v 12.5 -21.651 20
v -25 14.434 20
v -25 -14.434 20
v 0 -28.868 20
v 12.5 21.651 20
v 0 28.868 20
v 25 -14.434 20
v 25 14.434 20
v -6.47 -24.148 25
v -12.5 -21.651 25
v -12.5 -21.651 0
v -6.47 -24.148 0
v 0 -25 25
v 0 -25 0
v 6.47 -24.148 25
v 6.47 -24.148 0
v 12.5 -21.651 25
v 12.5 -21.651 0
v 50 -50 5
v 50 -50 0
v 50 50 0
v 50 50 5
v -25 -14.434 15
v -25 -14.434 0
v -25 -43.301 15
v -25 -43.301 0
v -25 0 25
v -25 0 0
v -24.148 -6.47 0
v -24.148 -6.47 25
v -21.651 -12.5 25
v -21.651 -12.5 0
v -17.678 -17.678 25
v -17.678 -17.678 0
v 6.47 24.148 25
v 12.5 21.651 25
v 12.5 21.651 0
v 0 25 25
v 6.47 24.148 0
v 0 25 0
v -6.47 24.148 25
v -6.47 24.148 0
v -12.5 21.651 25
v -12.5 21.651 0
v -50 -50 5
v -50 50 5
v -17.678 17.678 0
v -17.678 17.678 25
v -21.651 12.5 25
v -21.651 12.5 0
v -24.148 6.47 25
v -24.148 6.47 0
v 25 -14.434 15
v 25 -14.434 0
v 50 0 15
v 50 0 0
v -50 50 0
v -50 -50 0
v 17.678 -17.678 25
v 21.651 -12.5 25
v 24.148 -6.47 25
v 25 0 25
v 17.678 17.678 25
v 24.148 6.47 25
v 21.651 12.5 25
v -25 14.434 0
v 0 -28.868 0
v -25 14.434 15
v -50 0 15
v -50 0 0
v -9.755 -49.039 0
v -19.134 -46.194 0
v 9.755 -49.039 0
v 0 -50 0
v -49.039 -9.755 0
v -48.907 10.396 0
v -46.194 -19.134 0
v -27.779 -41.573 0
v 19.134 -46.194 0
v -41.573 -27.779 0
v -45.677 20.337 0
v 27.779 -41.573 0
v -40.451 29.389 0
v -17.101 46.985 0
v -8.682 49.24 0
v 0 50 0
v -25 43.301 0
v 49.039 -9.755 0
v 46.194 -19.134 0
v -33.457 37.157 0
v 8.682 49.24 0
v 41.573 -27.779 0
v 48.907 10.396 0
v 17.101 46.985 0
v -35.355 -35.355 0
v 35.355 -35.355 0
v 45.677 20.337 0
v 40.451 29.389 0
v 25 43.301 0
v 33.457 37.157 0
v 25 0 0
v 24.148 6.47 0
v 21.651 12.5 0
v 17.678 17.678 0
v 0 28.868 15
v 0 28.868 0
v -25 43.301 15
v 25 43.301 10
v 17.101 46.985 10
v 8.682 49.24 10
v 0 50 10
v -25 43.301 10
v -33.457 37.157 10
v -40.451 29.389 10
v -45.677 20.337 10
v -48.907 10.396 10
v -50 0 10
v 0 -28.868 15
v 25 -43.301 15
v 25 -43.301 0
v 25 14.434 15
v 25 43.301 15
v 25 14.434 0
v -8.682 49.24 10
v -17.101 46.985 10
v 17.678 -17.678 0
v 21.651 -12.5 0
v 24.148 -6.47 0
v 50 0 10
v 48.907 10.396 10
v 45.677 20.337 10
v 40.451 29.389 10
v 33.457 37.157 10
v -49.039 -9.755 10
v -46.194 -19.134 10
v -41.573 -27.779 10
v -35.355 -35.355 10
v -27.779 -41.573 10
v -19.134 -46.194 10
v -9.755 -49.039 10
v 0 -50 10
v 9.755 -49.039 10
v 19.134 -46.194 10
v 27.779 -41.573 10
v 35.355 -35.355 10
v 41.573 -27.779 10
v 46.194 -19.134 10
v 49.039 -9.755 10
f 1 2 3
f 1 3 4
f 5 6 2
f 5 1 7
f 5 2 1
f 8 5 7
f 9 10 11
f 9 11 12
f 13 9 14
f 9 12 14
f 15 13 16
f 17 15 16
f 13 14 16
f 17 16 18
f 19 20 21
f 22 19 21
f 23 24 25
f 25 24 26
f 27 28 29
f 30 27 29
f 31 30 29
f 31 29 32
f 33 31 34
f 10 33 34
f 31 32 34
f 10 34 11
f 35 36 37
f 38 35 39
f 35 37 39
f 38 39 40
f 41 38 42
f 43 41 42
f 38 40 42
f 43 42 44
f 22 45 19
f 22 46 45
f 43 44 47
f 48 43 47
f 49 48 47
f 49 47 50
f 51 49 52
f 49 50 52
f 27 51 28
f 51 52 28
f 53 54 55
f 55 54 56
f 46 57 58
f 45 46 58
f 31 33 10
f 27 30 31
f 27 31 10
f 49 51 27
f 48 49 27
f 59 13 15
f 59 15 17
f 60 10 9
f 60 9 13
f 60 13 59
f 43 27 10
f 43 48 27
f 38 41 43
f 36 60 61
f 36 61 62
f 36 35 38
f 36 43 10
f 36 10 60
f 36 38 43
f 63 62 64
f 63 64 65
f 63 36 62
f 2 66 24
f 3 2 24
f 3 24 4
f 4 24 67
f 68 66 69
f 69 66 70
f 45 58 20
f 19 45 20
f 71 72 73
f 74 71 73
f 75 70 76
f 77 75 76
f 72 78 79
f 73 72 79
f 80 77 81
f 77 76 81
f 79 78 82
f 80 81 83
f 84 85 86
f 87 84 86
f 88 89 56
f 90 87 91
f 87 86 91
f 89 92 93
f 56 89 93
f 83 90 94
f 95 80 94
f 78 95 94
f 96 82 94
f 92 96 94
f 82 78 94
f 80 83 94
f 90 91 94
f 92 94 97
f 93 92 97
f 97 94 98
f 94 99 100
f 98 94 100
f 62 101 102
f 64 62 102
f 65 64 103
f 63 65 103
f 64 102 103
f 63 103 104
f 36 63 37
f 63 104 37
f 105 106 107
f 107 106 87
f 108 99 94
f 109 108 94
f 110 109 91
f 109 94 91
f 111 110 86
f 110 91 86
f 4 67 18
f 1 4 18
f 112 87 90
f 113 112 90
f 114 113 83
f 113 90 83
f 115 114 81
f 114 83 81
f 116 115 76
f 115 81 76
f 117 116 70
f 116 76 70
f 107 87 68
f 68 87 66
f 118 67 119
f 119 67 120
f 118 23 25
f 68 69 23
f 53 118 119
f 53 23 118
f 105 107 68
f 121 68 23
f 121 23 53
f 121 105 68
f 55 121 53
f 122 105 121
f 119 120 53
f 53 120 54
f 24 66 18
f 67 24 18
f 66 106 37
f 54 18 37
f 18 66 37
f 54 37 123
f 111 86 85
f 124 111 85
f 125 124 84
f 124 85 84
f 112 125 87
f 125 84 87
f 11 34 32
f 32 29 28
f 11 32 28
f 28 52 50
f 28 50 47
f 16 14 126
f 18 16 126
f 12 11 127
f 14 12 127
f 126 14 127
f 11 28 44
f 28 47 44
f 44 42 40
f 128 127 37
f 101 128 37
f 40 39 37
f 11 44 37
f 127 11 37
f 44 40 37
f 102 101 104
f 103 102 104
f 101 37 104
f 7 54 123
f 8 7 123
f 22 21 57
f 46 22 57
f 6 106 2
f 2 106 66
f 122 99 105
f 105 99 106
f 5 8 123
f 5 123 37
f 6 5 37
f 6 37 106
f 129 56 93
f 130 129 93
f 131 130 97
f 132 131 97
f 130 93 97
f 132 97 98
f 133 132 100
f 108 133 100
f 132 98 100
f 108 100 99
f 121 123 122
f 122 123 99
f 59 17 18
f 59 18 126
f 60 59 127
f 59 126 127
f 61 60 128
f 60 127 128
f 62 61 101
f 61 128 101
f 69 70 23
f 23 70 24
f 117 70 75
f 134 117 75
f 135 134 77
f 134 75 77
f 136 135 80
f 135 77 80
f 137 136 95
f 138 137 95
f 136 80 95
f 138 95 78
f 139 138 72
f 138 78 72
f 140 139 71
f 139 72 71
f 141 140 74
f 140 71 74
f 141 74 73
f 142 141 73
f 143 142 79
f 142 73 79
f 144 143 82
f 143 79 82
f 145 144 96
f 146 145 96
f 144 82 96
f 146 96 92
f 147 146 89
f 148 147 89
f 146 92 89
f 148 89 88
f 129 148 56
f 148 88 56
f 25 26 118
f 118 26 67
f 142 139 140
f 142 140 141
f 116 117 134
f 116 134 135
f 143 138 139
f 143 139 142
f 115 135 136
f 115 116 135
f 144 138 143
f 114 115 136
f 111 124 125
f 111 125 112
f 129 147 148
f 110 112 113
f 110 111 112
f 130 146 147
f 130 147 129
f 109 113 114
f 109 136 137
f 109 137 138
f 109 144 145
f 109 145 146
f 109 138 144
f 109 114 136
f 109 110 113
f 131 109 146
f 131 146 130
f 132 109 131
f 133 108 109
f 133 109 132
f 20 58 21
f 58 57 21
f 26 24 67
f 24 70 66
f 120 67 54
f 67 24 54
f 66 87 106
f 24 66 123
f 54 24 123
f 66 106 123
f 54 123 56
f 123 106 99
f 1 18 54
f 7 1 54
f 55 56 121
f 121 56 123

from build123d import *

# Parameters (mm, degrees)
F1_DEPTH = 25
F2_DEPTH = 20
F3_DEPTH = 15
F4_DEPTH = 10
F5_DEPTH = 5


with BuildPart() as f1:
    # F0 (on Top) → F1 (new body)
    with BuildSketch(Plane.XY):
        with BuildLine():
            ThreePointArc((12.5000002531, -21.6506349485), (21.6506351677, -12.4999998734), (25, 0))
            ThreePointArc((25, 0), (21.6506351909, 12.4999998333), (12.5000003334, 21.6506349021))
            ThreePointArc((12.5000003334, 21.6506349021), (3.194e-07, 25), (-12.4999997802, 21.6506352215))
            ThreePointArc((-12.4999997802, 21.6506352215), (-21.650635044, 12.5000000877), (-25, -5.13e-08))
            ThreePointArc((-25, -5.13e-08), (-21.6506351561, -12.4999998936), (-12.5000002572, -21.6506349461))
            ThreePointArc((-12.5000002572, -21.6506349461), (-2.4e-09, -25), (12.5000002531, -21.6506349485))
        make_face()
    extrude(amount=F1_DEPTH)


with BuildPart() as f2:
    # F0 (on Top) → F2 (new body)
    with BuildSketch(Plane.XY):
        with BuildLine():
            Line((-12.4999997802, 21.6506352215), (-25, 14.4337567297))
            Line((-25, 14.4337567297), (-25, -5.13e-08))
            ThreePointArc((-25, -5.13e-08), (-21.650635044, 12.5000000877), (-12.4999997802, 21.6506352215))
        make_face()
        with BuildLine():
            Line((12.5000003334, 21.6506349021), (0, 28.8675134595))
            Line((0, 28.8675134595), (-12.4999997802, 21.6506352215))
            ThreePointArc((-12.4999997802, 21.6506352215), (3.194e-07, 25), (12.5000003334, 21.6506349021))
        make_face()
        with BuildLine():
            Line((25, 0), (25, 14.4337567297))
            Line((25, 14.4337567297), (12.5000003334, 21.6506349021))
            ThreePointArc((12.5000003334, 21.6506349021), (21.6506351909, 12.4999998333), (25, 0))
        make_face()
        with BuildLine():
            ThreePointArc((12.5000002531, -21.6506349485), (21.6506351677, -12.4999998734), (25, 0))
            ThreePointArc((25, 0), (21.6506351909, 12.4999998333), (12.5000003334, 21.6506349021))
            ThreePointArc((12.5000003334, 21.6506349021), (3.194e-07, 25), (-12.4999997802, 21.6506352215))
            ThreePointArc((-12.4999997802, 21.6506352215), (-21.650635044, 12.5000000877), (-25, -5.13e-08))
            ThreePointArc((-25, -5.13e-08), (-21.6506351561, -12.4999998936), (-12.5000002572, -21.6506349461))
            ThreePointArc((-12.5000002572, -21.6506349461), (-2.4e-09, -25), (12.5000002531, -21.6506349485))
        make_face()
        with BuildLine():
            Line((12.5000002531, -21.6506349485), (25, -14.4337567297))
            Line((25, -14.4337567297), (25, 0))
            ThreePointArc((25, 0), (21.6506351677, -12.4999998734), (12.5000002531, -21.6506349485))
        make_face()
        with BuildLine():
            Line((-12.5000002572, -21.6506349461), (0, -28.8675134595))
            Line((0, -28.8675134595), (12.5000002531, -21.6506349485))
            ThreePointArc((12.5000002531, -21.6506349485), (-2.4e-09, -25), (-12.5000002572, -21.6506349461))
        make_face()
        with BuildLine():
            Line((-25, -5.13e-08), (-25, -14.4337567297))
            Line((-25, -14.4337567297), (-12.5000002572, -21.6506349461))
            ThreePointArc((-12.5000002572, -21.6506349461), (-21.6506351561, -12.4999998936), (-25, -5.13e-08))
        make_face()
    extrude(amount=F2_DEPTH)


with BuildPart() as f3:
    # F0 (on Top) → F3 (new body)
    with BuildSketch(Plane.XY):
        Polygon((-25, 14.4337567297), (-50, 0), (-25, -14.4337567297), (-25, -5.13e-08), align=None)
        with BuildLine():
            Line((-12.4999997802, 21.6506352215), (-25, 14.4337567297))
            Line((-25, 14.4337567297), (-25, -5.13e-08))
            ThreePointArc((-25, -5.13e-08), (-21.650635044, 12.5000000877), (-12.4999997802, 21.6506352215))
        make_face()
        Polygon((0, 28.8675134595), (-25, 43.3012701892), (-25, 14.4337567297), (-12.4999997802, 21.6506352215), align=None)
        with BuildLine():
            Line((12.5000003334, 21.6506349021), (0, 28.8675134595))
            Line((0, 28.8675134595), (-12.4999997802, 21.6506352215))
            ThreePointArc((-12.4999997802, 21.6506352215), (3.194e-07, 25), (12.5000003334, 21.6506349021))
        make_face()
        Polygon((25, 14.4337567297), (25, 43.3012701892), (0, 28.8675134595), (12.5000003334, 21.6506349021), align=None)
        with BuildLine():
            Line((25, 0), (25, 14.4337567297))
            Line((25, 14.4337567297), (12.5000003334, 21.6506349021))
            ThreePointArc((12.5000003334, 21.6506349021), (21.6506351909, 12.4999998333), (25, 0))
        make_face()
        Polygon((25, -14.4337567297), (50, 0), (25, 14.4337567297), (25, 0), align=None)
        with BuildLine():
            Line((12.5000002531, -21.6506349485), (25, -14.4337567297))
            Line((25, -14.4337567297), (25, 0))
            ThreePointArc((25, 0), (21.6506351677, -12.4999998734), (12.5000002531, -21.6506349485))
        make_face()
        Polygon((0, -28.8675134595), (25, -43.3012701892), (25, -14.4337567297), (12.5000002531, -21.6506349485), align=None)
        with BuildLine():
            Line((-12.5000002572, -21.6506349461), (0, -28.8675134595))
            Line((0, -28.8675134595), (12.5000002531, -21.6506349485))
            ThreePointArc((12.5000002531, -21.6506349485), (-2.4e-09, -25), (-12.5000002572, -21.6506349461))
        make_face()
        Polygon((-25, -14.4337567297), (-25, -43.3012701892), (0, -28.8675134595), (-12.5000002572, -21.6506349461), align=None)
        with BuildLine():
            Line((-25, -5.13e-08), (-25, -14.4337567297))
            Line((-25, -14.4337567297), (-12.5000002572, -21.6506349461))
            ThreePointArc((-12.5000002572, -21.6506349461), (-21.6506351561, -12.4999998936), (-25, -5.13e-08))
        make_face()
        with BuildLine():
            ThreePointArc((12.5000002531, -21.6506349485), (21.6506351677, -12.4999998734), (25, 0))
            ThreePointArc((25, 0), (21.6506351909, 12.4999998333), (12.5000003334, 21.6506349021))
            ThreePointArc((12.5000003334, 21.6506349021), (3.194e-07, 25), (-12.4999997802, 21.6506352215))
            ThreePointArc((-12.4999997802, 21.6506352215), (-21.650635044, 12.5000000877), (-25, -5.13e-08))
            ThreePointArc((-25, -5.13e-08), (-21.6506351561, -12.4999998936), (-12.5000002572, -21.6506349461))
            ThreePointArc((-12.5000002572, -21.6506349461), (-2.4e-09, -25), (12.5000002531, -21.6506349485))
        make_face()
    extrude(amount=F3_DEPTH)


with BuildPart() as f4:
    # F0 (on Top) → F4 (new body)
    with BuildSketch(Plane.XY):
        with BuildLine():
            Line((-25, 43.3012701892), (25, 43.3012701892))
            ThreePointArc((25, 43.3012701892), (12.9409522085, 48.2962913269), (-9.65e-08, 50))
            ThreePointArc((-9.65e-08, 50), (-12.9409523018, 48.296291302), (-25, 43.3012701892))
        make_face()
        with BuildLine():
            Line((25, 43.3012701892), (50, 0))
            ThreePointArc((50, 0), (43.3012701892, 25), (25, 43.3012701892))
        make_face()
        Polygon((25, 14.4337567297), (50, 0), (25, 43.3012701892), align=None)
        Polygon((25, 14.4337567297), (25, 43.3012701892), (0, 28.8675134595), (12.5000003334, 21.6506349021), align=None)
        Polygon((0, 28.8675134595), (25, 43.3012701892), (-25, 43.3012701892), align=None)
        Polygon((0, 28.8675134595), (-25, 43.3012701892), (-25, 14.4337567297), (-12.4999997802, 21.6506352215), align=None)
        Polygon((-25, 14.4337567297), (-25, 43.3012701892), (-50, 0), align=None)
        with BuildLine():
            Line((-50, 0), (-25, 43.3012701892))
            ThreePointArc((-25, 43.3012701892), (-43.3012701892, 25), (-50, 0))
        make_face()
        with BuildLine():
            ThreePointArc((12.5000002531, -21.6506349485), (21.6506351677, -12.4999998734), (25, 0))
            ThreePointArc((25, 0), (21.6506351909, 12.4999998333), (12.5000003334, 21.6506349021))
            ThreePointArc((12.5000003334, 21.6506349021), (3.194e-07, 25), (-12.4999997802, 21.6506352215))
            ThreePointArc((-12.4999997802, 21.6506352215), (-21.650635044, 12.5000000877), (-25, -5.13e-08))
            ThreePointArc((-25, -5.13e-08), (-21.6506351561, -12.4999998936), (-12.5000002572, -21.6506349461))
            ThreePointArc((-12.5000002572, -21.6506349461), (-2.4e-09, -25), (12.5000002531, -21.6506349485))
        make_face()
        Polygon((25, -14.4337567297), (50, 0), (25, 14.4337567297), (25, 0), align=None)
        with BuildLine():
            Line((12.5000003334, 21.6506349021), (0, 28.8675134595))
            Line((0, 28.8675134595), (-12.4999997802, 21.6506352215))
            ThreePointArc((-12.4999997802, 21.6506352215), (3.194e-07, 25), (12.5000003334, 21.6506349021))
        make_face()
        Polygon((-25, 14.4337567297), (-50, 0), (-25, -14.4337567297), (-25, -5.13e-08), align=None)
        with BuildLine():
            ThreePointArc((-50, 0), (-43.3012701892, -25), (-25, -43.3012701892))
            Line((-25, -43.3012701892), (-50, 0))
        make_face()
        Polygon((-25, -14.4337567297), (-25, -43.3012701892), (0, -28.8675134595), (-12.5000002572, -21.6506349461), align=None)
        Polygon((-25, -43.3012701892), (25, -43.3012701892), (0, -28.8675134595), align=None)
        with BuildLine():
            ThreePointArc((2.28e-08, -50), (12.9409522661, -48.2962913115), (25, -43.3012701892))
            Line((25, -43.3012701892), (-25, -43.3012701892))
            ThreePointArc((-25, -43.3012701892), (-12.9409522441, -48.2962913174), (2.28e-08, -50))
        make_face()
        with BuildLine():
            ThreePointArc((25, -43.3012701892), (43.3012701892, -25), (50, 0))
            Line((50, 0), (25, -43.3012701892))
        make_face()
        Polygon((25, -43.3012701892), (50, 0), (25, -14.4337567297), align=None)
        with BuildLine():
            Line((12.5000002531, -21.6506349485), (25, -14.4337567297))
            Line((25, -14.4337567297), (25, 0))
            ThreePointArc((25, 0), (21.6506351677, -12.4999998734), (12.5000002531, -21.6506349485))
        make_face()
        Polygon((0, -28.8675134595), (25, -43.3012701892), (25, -14.4337567297), (12.5000002531, -21.6506349485), align=None)
        Polygon((-50, 0), (-25, -43.3012701892), (-25, -14.4337567297), align=None)
        with BuildLine():
            Line((-25, -5.13e-08), (-25, -14.4337567297))
            Line((-25, -14.4337567297), (-12.5000002572, -21.6506349461))
            ThreePointArc((-12.5000002572, -21.6506349461), (-21.6506351561, -12.4999998936), (-25, -5.13e-08))
        make_face()
        with BuildLine():
            Line((-12.4999997802, 21.6506352215), (-25, 14.4337567297))
            Line((-25, 14.4337567297), (-25, -5.13e-08))
            ThreePointArc((-25, -5.13e-08), (-21.650635044, 12.5000000877), (-12.4999997802, 21.6506352215))
        make_face()
        with BuildLine():
            Line((-12.5000002572, -21.6506349461), (0, -28.8675134595))
            Line((0, -28.8675134595), (12.5000002531, -21.6506349485))
            ThreePointArc((12.5000002531, -21.6506349485), (-2.4e-09, -25), (-12.5000002572, -21.6506349461))
        make_face()
        with BuildLine():
            Line((25, 0), (25, 14.4337567297))
            Line((25, 14.4337567297), (12.5000003334, 21.6506349021))
            ThreePointArc((12.5000003334, 21.6506349021), (21.6506351909, 12.4999998333), (25, 0))
        make_face()
    extrude(amount=F4_DEPTH)


with BuildPart() as f5:
    # F0 (on Top) → F5 (new body)
    with BuildSketch(Plane.XY):
        with BuildLine():
            ThreePointArc((-25, 43.3012701892), (-12.9409523018, 48.296291302), (-9.65e-08, 50))
            Line((-9.65e-08, 50), (-50, 50))
            Line((-50, 50), (-50, 0))
            ThreePointArc((-50, 0), (-43.3012701892, 25), (-25, 43.3012701892))
        make_face()
        with BuildLine():
            ThreePointArc((25, 43.3012701892), (43.3012701892, 25), (50, 0))
            Line((50, 0), (50, 50))
            Line((50, 50), (-9.65e-08, 50))
            ThreePointArc((-9.65e-08, 50), (12.9409522085, 48.2962913269), (25, 43.3012701892))
        make_face()
        with BuildLine():
            Line((-25, 43.3012701892), (25, 43.3012701892))
            ThreePointArc((25, 43.3012701892), (12.9409522085, 48.2962913269), (-9.65e-08, 50))
            ThreePointArc((-9.65e-08, 50), (-12.9409523018, 48.296291302), (-25, 43.3012701892))
        make_face()
        Polygon((0, 28.8675134595), (25, 43.3012701892), (-25, 43.3012701892), align=None)
        Polygon((25, 14.4337567297), (25, 43.3012701892), (0, 28.8675134595), (12.5000003334, 21.6506349021), align=None)
        Polygon((25, 14.4337567297), (50, 0), (25, 43.3012701892), align=None)
        with BuildLine():
            Line((25, 43.3012701892), (50, 0))
            ThreePointArc((50, 0), (43.3012701892, 25), (25, 43.3012701892))
        make_face()
        Polygon((0, 28.8675134595), (-25, 43.3012701892), (-25, 14.4337567297), (-12.4999997802, 21.6506352215), align=None)
        Polygon((-25, 14.4337567297), (-25, 43.3012701892), (-50, 0), align=None)
        with BuildLine():
            Line((-50, 0), (-25, 43.3012701892))
            ThreePointArc((-25, 43.3012701892), (-43.3012701892, 25), (-50, 0))
        make_face()
        Polygon((-25, 14.4337567297), (-50, 0), (-25, -14.4337567297), (-25, -5.13e-08), align=None)
        Polygon((25, -14.4337567297), (50, 0), (25, 14.4337567297), (25, 0), align=None)
        with BuildLine():
            ThreePointArc((25, -43.3012701892), (43.3012701892, -25), (50, 0))
            Line((50, 0), (25, -43.3012701892))
        make_face()
        Polygon((25, -43.3012701892), (50, 0), (25, -14.4337567297), align=None)
        Polygon((0, -28.8675134595), (25, -43.3012701892), (25, -14.4337567297), (12.5000002531, -21.6506349485), align=None)
        with BuildLine():
            Line((12.5000002531, -21.6506349485), (25, -14.4337567297))
            Line((25, -14.4337567297), (25, 0))
            ThreePointArc((25, 0), (21.6506351677, -12.4999998734), (12.5000002531, -21.6506349485))
        make_face()
        with BuildLine():
            Line((-25, -5.13e-08), (-25, -14.4337567297))
            Line((-25, -14.4337567297), (-12.5000002572, -21.6506349461))
            ThreePointArc((-12.5000002572, -21.6506349461), (-21.6506351561, -12.4999998936), (-25, -5.13e-08))
        make_face()
        Polygon((-25, -14.4337567297), (-25, -43.3012701892), (0, -28.8675134595), (-12.5000002572, -21.6506349461), align=None)
        Polygon((-25, -43.3012701892), (25, -43.3012701892), (0, -28.8675134595), align=None)
        with BuildLine():
            ThreePointArc((-50, 0), (-43.3012701892, -25), (-25, -43.3012701892))
            Line((-25, -43.3012701892), (-50, 0))
        make_face()
        Polygon((-50, 0), (-25, -43.3012701892), (-25, -14.4337567297), align=None)
        with BuildLine():
            Line((-50, -50), (2.28e-08, -50))
            ThreePointArc((2.28e-08, -50), (-12.9409522441, -48.2962913174), (-25, -43.3012701892))
            ThreePointArc((-25, -43.3012701892), (-43.3012701892, -25), (-50, 0))
            Line((-50, 0), (-50, -50))
        make_face()
        with BuildLine():
            Line((50, -50), (50, 0))
            ThreePointArc((50, 0), (43.3012701892, -25), (25, -43.3012701892))
            ThreePointArc((25, -43.3012701892), (12.9409522661, -48.2962913115), (2.28e-08, -50))
            Line((2.28e-08, -50), (50, -50))
        make_face()
        with BuildLine():
            ThreePointArc((2.28e-08, -50), (12.9409522661, -48.2962913115), (25, -43.3012701892))
            Line((25, -43.3012701892), (-25, -43.3012701892))
            ThreePointArc((-25, -43.3012701892), (-12.9409522441, -48.2962913174), (2.28e-08, -50))
        make_face()
        with BuildLine():
            Line((-12.4999997802, 21.6506352215), (-25, 14.4337567297))
            Line((-25, 14.4337567297), (-25, -5.13e-08))
            ThreePointArc((-25, -5.13e-08), (-21.650635044, 12.5000000877), (-12.4999997802, 21.6506352215))
        make_face()
        with BuildLine():
            Line((12.5000003334, 21.6506349021), (0, 28.8675134595))
            Line((0, 28.8675134595), (-12.4999997802, 21.6506352215))
            ThreePointArc((-12.4999997802, 21.6506352215), (3.194e-07, 25), (12.5000003334, 21.6506349021))
        make_face()
        with BuildLine():
            Line((25, 0), (25, 14.4337567297))
            Line((25, 14.4337567297), (12.5000003334, 21.6506349021))
            ThreePointArc((12.5000003334, 21.6506349021), (21.6506351909, 12.4999998333), (25, 0))
        make_face()
        with BuildLine():
            ThreePointArc((12.5000002531, -21.6506349485), (21.6506351677, -12.4999998734), (25, 0))
            ThreePointArc((25, 0), (21.6506351909, 12.4999998333), (12.5000003334, 21.6506349021))
            ThreePointArc((12.5000003334, 21.6506349021), (3.194e-07, 25), (-12.4999997802, 21.6506352215))
            ThreePointArc((-12.4999997802, 21.6506352215), (-21.650635044, 12.5000000877), (-25, -5.13e-08))
            ThreePointArc((-25, -5.13e-08), (-21.6506351561, -12.4999998936), (-12.5000002572, -21.6506349461))
            ThreePointArc((-12.5000002572, -21.6506349461), (-2.4e-09, -25), (12.5000002531, -21.6506349485))
        make_face()
        with BuildLine():
            Line((-12.5000002572, -21.6506349461), (0, -28.8675134595))
            Line((0, -28.8675134595), (12.5000002531, -21.6506349485))
            ThreePointArc((12.5000002531, -21.6506349485), (-2.4e-09, -25), (-12.5000002572, -21.6506349461))
        make_face()
    extrude(amount=F5_DEPTH)


solid = Compound([f1.part, f2.part, f3.part, f4.part, f5.part])
